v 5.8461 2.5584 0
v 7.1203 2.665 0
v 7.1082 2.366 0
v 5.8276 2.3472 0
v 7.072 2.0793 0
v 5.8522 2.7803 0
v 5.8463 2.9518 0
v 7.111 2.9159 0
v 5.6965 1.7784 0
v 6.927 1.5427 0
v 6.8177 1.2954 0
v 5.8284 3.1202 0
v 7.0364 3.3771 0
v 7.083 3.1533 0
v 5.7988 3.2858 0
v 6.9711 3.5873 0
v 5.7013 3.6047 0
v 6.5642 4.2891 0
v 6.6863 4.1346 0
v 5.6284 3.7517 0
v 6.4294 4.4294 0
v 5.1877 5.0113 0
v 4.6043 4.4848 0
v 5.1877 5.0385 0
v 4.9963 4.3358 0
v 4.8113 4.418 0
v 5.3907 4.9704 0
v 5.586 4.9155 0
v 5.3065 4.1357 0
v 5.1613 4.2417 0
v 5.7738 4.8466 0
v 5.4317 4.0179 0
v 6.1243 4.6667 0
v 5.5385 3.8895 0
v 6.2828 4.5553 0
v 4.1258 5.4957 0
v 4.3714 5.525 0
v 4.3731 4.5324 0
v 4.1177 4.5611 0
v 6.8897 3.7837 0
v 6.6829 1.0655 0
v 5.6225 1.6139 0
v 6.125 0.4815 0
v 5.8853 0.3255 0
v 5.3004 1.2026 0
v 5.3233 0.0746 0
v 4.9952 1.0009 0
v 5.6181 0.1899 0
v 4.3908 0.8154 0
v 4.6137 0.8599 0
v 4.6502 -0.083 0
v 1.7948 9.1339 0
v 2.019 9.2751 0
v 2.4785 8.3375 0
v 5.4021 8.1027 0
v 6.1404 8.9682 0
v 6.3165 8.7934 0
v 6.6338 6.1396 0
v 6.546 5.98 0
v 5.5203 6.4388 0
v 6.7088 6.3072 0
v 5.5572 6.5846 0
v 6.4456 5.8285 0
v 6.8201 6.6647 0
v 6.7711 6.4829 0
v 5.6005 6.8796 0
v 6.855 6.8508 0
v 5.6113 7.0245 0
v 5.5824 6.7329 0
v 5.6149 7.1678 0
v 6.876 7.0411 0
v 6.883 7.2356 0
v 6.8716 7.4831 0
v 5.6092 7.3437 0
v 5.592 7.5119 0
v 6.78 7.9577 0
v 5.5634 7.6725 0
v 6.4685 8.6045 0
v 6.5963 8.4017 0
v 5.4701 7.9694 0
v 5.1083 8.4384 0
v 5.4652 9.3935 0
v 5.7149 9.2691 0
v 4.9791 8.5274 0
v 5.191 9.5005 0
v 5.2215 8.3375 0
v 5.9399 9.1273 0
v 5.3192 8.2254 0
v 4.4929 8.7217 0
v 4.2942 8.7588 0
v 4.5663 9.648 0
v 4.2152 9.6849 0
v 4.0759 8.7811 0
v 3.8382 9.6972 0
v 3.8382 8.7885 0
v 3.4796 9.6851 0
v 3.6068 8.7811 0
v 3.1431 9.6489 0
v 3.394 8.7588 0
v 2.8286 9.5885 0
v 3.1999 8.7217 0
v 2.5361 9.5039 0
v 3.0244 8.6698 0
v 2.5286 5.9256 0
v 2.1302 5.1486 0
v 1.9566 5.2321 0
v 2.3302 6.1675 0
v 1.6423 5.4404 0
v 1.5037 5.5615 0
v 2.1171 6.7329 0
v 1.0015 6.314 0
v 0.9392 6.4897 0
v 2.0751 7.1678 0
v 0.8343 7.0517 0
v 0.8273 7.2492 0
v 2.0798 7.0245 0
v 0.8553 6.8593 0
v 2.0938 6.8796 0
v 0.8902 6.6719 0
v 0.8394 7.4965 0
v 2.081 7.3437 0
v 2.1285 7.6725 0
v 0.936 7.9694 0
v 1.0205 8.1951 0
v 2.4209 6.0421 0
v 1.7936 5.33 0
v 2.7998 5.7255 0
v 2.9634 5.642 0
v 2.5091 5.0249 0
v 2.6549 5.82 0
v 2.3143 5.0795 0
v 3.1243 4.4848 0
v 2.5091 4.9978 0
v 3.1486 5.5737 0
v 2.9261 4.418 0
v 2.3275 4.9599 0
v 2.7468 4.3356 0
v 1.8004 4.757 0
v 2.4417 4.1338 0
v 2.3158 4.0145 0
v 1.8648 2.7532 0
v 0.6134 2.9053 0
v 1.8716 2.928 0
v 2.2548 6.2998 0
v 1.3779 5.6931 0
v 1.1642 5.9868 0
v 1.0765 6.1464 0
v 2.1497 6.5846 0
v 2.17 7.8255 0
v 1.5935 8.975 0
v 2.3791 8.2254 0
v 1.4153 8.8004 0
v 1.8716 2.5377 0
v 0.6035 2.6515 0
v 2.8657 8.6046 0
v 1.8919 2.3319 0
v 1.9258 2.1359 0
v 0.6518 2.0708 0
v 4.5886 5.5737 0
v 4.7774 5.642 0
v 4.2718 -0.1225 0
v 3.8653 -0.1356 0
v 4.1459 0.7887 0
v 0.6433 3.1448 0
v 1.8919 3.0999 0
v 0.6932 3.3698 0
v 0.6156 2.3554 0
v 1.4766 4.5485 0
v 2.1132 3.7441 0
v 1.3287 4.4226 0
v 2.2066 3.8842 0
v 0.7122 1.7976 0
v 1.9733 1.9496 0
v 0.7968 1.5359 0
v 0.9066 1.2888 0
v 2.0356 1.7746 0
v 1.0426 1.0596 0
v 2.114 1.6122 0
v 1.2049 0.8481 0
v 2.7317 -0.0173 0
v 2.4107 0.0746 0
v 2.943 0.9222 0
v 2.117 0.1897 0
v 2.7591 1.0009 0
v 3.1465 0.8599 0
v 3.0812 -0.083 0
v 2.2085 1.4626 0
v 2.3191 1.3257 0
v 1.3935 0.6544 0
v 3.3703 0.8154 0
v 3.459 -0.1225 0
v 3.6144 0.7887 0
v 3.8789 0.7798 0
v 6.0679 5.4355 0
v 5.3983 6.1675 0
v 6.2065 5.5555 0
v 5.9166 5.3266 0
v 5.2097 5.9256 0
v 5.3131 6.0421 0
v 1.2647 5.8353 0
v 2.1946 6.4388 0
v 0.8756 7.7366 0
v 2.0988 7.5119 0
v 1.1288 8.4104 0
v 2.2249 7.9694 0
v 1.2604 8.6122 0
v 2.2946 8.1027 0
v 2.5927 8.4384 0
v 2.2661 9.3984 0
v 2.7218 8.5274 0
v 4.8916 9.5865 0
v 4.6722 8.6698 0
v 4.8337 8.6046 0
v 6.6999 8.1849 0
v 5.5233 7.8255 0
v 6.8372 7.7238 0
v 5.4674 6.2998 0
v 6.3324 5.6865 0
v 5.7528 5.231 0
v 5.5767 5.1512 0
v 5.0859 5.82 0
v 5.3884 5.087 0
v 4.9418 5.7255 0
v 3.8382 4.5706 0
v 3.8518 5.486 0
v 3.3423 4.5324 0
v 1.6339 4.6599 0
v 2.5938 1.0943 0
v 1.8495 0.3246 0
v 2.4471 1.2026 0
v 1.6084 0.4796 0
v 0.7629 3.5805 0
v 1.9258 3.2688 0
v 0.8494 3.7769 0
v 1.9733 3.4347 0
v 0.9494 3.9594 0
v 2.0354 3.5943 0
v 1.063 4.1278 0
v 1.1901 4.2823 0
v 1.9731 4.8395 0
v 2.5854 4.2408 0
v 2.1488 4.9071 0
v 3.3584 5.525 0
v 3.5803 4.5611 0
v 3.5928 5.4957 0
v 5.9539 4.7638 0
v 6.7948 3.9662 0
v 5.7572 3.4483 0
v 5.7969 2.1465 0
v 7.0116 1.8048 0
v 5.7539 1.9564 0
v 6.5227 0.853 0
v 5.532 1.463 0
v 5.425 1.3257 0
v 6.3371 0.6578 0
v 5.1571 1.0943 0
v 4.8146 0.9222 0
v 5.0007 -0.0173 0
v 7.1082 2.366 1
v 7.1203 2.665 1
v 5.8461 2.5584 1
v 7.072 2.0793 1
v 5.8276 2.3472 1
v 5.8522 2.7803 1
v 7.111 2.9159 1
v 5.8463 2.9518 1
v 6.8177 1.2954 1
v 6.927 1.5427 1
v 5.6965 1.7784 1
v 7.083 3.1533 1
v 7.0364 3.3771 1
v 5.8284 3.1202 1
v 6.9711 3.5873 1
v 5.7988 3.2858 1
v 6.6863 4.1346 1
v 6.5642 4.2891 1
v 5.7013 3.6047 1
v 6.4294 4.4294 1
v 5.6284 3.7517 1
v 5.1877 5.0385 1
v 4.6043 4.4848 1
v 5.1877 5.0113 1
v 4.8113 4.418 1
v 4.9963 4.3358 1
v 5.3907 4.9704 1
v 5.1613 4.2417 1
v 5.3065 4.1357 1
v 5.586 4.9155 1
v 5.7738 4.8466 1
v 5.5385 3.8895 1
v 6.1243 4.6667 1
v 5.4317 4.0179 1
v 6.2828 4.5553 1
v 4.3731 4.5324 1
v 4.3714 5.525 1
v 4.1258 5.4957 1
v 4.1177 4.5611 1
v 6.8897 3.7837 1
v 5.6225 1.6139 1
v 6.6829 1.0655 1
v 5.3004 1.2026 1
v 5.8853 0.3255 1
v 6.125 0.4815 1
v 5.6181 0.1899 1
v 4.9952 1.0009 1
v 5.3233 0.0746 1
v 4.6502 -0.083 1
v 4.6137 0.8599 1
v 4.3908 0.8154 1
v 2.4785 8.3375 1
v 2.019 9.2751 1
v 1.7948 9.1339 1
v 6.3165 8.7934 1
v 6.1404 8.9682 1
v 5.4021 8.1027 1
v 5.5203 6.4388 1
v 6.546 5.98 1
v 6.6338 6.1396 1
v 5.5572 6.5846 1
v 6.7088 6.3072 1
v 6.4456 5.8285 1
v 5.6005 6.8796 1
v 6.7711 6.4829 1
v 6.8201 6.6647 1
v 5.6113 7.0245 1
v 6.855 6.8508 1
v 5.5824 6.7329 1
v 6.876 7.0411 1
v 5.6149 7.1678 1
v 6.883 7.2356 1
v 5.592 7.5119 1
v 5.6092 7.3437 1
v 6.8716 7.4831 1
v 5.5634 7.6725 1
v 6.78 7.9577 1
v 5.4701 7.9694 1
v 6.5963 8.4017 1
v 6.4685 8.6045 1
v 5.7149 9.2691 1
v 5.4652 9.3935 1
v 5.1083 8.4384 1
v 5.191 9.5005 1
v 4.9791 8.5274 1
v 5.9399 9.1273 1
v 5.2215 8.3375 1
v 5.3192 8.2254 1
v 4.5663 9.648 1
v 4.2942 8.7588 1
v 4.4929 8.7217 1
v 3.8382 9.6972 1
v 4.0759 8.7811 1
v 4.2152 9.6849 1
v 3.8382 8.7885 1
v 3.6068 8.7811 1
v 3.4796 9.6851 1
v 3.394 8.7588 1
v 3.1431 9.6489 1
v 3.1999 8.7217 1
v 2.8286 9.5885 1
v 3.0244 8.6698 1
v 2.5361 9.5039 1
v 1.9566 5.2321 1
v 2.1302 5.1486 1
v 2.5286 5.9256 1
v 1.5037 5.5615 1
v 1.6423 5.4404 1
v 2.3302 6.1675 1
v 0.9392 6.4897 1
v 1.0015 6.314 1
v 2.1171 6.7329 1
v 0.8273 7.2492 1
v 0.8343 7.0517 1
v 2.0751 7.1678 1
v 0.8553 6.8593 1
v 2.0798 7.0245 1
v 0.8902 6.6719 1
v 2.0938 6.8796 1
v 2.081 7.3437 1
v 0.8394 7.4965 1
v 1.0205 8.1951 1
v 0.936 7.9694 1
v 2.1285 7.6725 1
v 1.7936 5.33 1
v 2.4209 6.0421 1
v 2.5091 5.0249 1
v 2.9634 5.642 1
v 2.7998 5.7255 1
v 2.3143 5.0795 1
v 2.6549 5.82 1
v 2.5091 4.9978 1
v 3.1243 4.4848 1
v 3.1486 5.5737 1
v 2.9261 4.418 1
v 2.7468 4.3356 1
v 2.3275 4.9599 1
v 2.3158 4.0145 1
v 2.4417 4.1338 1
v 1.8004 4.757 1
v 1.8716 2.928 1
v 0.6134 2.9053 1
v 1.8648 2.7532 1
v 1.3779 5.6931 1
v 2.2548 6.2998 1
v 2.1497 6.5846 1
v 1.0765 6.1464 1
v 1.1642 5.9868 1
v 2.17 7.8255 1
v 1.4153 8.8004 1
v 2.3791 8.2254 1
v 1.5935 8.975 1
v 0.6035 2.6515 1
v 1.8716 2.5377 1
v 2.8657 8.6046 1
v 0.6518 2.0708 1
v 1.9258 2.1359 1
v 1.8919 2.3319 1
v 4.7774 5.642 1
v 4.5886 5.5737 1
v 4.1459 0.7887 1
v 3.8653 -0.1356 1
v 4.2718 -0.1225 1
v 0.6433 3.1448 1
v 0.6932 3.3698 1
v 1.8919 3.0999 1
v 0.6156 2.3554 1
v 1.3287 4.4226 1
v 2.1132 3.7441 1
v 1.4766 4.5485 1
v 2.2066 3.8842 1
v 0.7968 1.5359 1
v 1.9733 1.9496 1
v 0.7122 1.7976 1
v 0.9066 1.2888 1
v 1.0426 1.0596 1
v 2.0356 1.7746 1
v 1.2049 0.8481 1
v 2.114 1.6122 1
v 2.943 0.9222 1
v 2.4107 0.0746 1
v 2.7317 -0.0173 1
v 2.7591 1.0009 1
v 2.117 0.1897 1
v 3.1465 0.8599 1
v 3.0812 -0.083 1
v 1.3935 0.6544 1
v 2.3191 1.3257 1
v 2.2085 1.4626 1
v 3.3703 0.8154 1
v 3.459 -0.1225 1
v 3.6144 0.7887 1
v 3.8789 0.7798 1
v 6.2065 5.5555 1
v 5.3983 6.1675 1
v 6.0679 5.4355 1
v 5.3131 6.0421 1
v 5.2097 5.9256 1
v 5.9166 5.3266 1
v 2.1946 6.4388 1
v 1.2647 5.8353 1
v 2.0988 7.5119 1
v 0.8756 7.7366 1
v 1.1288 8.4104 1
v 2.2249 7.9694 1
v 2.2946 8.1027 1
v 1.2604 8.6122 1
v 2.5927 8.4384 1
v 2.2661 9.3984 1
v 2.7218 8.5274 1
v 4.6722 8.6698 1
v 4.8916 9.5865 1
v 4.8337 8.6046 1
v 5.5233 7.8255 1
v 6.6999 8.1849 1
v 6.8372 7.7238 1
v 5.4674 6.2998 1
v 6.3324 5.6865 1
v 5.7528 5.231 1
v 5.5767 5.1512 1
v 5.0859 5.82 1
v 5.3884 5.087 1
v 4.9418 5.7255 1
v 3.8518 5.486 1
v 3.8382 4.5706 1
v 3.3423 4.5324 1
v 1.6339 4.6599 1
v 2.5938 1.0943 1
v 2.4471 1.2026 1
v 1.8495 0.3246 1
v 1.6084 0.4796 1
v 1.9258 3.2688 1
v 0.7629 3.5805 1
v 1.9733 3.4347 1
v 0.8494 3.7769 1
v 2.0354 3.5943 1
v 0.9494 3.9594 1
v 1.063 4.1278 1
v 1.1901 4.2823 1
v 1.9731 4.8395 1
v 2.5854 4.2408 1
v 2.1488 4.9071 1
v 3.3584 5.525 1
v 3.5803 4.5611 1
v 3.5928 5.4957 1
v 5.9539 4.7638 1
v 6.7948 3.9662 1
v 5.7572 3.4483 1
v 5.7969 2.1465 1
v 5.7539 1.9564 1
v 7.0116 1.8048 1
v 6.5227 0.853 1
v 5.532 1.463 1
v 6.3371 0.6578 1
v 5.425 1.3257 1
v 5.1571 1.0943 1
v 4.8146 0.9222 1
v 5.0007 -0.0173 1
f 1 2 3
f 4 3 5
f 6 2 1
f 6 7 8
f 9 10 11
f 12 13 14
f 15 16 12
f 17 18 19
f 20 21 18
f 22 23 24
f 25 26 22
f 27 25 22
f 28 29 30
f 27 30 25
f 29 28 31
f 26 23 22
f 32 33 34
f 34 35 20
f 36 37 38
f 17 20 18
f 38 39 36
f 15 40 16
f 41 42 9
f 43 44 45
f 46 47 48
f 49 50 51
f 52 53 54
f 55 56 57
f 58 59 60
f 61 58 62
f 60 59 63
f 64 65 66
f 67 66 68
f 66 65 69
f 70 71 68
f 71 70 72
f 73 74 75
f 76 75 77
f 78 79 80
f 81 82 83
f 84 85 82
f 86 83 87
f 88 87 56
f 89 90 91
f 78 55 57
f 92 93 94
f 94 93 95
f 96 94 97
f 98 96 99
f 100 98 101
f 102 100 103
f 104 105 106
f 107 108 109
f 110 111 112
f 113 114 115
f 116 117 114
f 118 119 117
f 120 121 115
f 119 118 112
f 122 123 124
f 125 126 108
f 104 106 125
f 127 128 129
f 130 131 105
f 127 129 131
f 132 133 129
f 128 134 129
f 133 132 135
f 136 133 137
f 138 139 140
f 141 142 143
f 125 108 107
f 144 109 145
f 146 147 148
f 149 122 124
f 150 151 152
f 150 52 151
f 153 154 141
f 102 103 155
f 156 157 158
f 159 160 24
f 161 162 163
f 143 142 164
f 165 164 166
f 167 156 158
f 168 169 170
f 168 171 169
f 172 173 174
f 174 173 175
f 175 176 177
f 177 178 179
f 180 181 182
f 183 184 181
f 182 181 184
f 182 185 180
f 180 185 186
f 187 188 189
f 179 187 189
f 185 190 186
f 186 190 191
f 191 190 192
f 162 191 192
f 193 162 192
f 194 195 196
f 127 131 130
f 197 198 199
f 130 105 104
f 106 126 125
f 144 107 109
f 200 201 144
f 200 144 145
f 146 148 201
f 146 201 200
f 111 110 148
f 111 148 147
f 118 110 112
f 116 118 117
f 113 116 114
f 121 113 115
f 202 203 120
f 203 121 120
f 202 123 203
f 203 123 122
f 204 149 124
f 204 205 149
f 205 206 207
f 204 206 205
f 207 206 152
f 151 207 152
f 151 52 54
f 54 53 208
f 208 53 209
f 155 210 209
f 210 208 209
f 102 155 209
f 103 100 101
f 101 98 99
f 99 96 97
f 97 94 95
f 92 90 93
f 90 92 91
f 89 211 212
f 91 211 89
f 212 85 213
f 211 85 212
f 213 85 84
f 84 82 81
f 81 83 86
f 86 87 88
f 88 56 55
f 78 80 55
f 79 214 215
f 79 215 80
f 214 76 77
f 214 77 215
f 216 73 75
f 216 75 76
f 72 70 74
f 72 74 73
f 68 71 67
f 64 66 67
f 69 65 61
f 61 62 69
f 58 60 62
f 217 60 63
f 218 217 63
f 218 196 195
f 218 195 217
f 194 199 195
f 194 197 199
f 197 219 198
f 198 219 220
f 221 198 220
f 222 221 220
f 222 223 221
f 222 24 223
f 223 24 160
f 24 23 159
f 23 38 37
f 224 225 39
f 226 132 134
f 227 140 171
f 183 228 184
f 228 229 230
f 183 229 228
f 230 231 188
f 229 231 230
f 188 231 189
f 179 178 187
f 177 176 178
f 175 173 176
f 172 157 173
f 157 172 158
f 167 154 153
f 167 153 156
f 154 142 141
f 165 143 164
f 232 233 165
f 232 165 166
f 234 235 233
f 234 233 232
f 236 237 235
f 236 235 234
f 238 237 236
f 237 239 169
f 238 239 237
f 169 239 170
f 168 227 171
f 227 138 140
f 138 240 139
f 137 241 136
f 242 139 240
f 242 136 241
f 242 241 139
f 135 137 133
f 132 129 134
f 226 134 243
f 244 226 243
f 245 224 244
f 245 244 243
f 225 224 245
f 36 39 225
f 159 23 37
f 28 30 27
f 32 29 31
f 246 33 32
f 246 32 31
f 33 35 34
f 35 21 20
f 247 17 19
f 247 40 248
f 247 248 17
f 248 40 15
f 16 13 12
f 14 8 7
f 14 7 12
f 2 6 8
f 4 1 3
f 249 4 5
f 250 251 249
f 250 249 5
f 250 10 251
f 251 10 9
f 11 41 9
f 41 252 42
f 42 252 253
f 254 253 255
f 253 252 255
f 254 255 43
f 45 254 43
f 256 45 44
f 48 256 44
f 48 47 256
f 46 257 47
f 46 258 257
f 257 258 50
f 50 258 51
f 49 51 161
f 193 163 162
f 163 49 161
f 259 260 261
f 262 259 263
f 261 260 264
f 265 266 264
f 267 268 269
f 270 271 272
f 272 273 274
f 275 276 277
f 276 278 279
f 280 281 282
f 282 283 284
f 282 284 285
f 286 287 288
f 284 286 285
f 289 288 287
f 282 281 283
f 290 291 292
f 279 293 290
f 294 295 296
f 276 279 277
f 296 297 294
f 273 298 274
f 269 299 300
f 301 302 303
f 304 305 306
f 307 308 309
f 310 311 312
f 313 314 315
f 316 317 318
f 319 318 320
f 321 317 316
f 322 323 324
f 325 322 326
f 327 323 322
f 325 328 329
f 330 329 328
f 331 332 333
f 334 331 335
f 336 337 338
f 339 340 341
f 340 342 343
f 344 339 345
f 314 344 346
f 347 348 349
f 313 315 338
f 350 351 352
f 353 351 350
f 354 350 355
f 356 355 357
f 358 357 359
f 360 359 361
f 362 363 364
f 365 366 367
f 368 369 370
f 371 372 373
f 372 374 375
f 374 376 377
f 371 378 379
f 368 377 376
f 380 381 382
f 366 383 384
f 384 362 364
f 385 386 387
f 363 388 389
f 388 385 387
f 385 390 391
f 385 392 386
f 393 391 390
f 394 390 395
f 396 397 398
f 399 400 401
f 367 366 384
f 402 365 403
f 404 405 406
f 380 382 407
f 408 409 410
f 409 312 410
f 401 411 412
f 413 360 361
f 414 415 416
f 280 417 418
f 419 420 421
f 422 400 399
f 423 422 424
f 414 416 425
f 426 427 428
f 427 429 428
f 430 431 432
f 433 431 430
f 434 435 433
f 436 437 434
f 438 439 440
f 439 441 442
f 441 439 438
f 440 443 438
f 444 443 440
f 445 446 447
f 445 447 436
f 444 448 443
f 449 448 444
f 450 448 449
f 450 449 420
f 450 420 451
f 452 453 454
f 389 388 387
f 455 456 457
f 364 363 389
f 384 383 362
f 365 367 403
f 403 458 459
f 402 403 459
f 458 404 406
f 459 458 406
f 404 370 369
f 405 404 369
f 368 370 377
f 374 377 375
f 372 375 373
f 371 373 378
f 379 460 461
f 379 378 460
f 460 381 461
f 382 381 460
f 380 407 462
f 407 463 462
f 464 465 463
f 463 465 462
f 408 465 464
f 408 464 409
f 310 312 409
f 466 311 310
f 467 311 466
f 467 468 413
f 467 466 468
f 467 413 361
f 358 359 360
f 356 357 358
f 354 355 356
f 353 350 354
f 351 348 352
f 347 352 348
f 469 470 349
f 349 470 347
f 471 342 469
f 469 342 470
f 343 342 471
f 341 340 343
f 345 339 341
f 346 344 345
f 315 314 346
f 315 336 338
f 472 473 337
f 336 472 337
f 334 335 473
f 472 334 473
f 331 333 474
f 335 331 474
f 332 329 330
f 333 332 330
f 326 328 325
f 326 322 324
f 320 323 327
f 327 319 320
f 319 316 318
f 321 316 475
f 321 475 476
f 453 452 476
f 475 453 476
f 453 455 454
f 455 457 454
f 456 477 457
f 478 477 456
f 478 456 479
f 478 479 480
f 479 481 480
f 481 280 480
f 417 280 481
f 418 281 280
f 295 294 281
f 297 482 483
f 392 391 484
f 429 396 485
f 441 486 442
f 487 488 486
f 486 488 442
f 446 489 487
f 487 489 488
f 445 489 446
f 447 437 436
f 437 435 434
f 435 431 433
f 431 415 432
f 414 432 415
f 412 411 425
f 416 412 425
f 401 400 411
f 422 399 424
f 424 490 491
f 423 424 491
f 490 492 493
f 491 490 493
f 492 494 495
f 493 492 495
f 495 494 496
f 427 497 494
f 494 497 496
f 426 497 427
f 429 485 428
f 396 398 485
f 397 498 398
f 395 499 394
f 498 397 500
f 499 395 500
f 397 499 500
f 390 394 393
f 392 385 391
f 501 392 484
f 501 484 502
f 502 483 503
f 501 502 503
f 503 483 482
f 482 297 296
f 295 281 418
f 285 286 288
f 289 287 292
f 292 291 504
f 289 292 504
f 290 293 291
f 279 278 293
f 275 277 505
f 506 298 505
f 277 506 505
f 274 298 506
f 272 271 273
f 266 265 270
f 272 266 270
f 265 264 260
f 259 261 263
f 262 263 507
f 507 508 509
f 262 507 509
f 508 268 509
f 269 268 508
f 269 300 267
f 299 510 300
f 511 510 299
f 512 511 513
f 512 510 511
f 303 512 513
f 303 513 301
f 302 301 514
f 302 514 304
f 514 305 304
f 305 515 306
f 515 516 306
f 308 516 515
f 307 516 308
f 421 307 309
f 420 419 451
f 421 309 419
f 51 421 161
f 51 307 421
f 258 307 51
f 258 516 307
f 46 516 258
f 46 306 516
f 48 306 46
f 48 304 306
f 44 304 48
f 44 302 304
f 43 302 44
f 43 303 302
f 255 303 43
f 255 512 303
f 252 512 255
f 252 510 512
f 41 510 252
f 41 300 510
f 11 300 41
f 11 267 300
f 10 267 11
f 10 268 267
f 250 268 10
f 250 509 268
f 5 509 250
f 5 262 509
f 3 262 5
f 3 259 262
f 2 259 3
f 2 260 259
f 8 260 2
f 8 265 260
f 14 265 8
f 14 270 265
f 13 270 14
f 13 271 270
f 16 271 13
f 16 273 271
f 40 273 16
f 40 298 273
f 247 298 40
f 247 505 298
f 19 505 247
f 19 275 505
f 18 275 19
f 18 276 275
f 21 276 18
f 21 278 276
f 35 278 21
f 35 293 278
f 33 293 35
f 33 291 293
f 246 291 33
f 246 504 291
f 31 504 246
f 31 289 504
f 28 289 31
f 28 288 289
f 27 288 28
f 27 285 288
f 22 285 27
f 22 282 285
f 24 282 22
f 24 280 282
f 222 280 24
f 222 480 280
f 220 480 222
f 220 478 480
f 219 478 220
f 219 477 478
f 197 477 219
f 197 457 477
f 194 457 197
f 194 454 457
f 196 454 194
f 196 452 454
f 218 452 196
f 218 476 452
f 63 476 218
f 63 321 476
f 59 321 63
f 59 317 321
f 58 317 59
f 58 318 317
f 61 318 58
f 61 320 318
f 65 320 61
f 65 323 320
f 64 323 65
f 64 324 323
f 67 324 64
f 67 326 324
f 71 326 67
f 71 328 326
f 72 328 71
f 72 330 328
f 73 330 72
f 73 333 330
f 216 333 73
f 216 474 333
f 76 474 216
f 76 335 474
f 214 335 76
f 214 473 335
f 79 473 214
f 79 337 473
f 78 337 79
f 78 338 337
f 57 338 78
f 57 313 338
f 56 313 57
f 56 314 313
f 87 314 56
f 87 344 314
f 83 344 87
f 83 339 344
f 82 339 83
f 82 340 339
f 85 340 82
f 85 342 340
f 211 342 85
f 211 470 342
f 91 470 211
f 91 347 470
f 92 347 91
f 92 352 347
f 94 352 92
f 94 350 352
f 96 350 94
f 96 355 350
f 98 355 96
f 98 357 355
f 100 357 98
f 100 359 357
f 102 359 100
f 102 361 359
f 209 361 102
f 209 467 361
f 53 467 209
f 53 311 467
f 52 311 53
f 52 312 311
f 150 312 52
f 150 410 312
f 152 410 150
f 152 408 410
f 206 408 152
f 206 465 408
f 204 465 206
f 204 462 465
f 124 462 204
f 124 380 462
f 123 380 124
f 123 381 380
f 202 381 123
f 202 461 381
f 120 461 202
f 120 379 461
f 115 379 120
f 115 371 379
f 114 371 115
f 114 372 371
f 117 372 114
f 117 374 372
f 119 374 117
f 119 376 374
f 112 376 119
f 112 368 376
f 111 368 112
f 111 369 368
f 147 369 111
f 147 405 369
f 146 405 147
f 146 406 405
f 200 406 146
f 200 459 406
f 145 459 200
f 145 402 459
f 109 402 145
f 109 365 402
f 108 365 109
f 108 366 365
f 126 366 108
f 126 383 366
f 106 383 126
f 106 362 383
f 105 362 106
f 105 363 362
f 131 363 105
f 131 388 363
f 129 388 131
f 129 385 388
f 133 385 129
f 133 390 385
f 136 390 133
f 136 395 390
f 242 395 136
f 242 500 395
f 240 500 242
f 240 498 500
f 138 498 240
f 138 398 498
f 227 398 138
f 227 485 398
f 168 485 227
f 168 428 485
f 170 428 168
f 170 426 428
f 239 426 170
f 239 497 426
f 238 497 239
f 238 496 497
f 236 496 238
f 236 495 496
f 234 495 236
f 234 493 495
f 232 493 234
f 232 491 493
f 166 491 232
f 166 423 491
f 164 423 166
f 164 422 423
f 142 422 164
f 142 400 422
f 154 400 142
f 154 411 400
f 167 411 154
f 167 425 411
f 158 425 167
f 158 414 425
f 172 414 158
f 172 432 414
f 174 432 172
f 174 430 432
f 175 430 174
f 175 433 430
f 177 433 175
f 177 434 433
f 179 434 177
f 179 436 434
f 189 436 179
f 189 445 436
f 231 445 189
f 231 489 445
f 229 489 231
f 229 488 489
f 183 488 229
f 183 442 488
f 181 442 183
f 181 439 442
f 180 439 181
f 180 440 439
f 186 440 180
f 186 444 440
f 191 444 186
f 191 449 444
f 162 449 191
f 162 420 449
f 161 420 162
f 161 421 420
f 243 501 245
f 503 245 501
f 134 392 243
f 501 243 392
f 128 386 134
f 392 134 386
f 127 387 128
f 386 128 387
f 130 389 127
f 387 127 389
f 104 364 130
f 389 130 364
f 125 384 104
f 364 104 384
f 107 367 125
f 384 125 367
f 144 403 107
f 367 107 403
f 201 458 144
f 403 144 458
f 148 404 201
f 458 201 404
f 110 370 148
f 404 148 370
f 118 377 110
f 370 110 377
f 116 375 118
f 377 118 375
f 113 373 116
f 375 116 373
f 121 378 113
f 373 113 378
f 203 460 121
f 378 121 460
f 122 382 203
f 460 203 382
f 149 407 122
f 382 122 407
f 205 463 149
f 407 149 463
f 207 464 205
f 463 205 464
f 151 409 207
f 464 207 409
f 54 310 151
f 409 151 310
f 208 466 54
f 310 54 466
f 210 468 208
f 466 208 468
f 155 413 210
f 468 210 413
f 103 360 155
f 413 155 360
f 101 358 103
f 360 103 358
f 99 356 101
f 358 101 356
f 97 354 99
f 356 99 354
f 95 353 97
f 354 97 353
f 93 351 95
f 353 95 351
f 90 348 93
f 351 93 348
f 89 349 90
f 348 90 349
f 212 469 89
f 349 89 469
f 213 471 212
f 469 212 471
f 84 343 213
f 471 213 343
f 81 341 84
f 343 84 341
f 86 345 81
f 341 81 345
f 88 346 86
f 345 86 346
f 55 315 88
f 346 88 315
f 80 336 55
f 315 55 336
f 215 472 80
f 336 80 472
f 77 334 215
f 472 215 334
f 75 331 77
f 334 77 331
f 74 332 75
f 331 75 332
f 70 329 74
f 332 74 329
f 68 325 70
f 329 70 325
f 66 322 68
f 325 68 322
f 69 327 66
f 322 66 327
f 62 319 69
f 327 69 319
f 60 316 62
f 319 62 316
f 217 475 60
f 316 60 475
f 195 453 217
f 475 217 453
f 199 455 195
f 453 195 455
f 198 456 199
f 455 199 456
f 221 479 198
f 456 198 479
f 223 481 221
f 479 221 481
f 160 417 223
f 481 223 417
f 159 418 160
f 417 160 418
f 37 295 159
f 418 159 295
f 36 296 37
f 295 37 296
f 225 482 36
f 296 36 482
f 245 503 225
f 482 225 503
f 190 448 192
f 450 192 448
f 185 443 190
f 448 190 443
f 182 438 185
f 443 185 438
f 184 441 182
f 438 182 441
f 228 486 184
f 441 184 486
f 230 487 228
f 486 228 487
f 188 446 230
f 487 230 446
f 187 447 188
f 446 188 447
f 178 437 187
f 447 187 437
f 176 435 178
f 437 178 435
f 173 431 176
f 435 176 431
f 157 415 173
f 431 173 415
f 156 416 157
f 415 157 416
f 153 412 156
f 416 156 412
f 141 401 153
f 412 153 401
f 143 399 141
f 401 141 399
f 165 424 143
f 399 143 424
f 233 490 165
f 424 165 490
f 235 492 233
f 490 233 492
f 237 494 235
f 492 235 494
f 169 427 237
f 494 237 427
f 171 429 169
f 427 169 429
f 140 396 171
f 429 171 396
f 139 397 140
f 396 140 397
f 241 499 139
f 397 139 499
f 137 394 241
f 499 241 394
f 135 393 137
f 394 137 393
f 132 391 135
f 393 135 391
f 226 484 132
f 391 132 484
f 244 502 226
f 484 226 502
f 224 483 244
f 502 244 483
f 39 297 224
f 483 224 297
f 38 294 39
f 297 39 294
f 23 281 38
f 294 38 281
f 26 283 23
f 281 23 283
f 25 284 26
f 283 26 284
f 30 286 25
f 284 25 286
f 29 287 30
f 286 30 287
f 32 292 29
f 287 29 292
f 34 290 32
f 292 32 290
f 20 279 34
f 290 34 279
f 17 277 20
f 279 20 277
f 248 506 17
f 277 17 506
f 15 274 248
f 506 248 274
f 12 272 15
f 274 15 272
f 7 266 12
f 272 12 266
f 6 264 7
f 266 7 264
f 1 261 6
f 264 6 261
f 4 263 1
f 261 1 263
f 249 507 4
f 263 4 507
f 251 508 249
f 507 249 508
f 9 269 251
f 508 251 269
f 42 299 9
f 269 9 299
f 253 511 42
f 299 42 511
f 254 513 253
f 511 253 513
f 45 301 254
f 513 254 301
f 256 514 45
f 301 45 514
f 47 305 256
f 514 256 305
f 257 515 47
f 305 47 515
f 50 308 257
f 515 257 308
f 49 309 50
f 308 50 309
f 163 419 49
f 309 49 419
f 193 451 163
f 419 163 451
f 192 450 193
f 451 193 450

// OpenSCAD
content = "8";

linear_extrude(height = 1) {
	text(content);
}
